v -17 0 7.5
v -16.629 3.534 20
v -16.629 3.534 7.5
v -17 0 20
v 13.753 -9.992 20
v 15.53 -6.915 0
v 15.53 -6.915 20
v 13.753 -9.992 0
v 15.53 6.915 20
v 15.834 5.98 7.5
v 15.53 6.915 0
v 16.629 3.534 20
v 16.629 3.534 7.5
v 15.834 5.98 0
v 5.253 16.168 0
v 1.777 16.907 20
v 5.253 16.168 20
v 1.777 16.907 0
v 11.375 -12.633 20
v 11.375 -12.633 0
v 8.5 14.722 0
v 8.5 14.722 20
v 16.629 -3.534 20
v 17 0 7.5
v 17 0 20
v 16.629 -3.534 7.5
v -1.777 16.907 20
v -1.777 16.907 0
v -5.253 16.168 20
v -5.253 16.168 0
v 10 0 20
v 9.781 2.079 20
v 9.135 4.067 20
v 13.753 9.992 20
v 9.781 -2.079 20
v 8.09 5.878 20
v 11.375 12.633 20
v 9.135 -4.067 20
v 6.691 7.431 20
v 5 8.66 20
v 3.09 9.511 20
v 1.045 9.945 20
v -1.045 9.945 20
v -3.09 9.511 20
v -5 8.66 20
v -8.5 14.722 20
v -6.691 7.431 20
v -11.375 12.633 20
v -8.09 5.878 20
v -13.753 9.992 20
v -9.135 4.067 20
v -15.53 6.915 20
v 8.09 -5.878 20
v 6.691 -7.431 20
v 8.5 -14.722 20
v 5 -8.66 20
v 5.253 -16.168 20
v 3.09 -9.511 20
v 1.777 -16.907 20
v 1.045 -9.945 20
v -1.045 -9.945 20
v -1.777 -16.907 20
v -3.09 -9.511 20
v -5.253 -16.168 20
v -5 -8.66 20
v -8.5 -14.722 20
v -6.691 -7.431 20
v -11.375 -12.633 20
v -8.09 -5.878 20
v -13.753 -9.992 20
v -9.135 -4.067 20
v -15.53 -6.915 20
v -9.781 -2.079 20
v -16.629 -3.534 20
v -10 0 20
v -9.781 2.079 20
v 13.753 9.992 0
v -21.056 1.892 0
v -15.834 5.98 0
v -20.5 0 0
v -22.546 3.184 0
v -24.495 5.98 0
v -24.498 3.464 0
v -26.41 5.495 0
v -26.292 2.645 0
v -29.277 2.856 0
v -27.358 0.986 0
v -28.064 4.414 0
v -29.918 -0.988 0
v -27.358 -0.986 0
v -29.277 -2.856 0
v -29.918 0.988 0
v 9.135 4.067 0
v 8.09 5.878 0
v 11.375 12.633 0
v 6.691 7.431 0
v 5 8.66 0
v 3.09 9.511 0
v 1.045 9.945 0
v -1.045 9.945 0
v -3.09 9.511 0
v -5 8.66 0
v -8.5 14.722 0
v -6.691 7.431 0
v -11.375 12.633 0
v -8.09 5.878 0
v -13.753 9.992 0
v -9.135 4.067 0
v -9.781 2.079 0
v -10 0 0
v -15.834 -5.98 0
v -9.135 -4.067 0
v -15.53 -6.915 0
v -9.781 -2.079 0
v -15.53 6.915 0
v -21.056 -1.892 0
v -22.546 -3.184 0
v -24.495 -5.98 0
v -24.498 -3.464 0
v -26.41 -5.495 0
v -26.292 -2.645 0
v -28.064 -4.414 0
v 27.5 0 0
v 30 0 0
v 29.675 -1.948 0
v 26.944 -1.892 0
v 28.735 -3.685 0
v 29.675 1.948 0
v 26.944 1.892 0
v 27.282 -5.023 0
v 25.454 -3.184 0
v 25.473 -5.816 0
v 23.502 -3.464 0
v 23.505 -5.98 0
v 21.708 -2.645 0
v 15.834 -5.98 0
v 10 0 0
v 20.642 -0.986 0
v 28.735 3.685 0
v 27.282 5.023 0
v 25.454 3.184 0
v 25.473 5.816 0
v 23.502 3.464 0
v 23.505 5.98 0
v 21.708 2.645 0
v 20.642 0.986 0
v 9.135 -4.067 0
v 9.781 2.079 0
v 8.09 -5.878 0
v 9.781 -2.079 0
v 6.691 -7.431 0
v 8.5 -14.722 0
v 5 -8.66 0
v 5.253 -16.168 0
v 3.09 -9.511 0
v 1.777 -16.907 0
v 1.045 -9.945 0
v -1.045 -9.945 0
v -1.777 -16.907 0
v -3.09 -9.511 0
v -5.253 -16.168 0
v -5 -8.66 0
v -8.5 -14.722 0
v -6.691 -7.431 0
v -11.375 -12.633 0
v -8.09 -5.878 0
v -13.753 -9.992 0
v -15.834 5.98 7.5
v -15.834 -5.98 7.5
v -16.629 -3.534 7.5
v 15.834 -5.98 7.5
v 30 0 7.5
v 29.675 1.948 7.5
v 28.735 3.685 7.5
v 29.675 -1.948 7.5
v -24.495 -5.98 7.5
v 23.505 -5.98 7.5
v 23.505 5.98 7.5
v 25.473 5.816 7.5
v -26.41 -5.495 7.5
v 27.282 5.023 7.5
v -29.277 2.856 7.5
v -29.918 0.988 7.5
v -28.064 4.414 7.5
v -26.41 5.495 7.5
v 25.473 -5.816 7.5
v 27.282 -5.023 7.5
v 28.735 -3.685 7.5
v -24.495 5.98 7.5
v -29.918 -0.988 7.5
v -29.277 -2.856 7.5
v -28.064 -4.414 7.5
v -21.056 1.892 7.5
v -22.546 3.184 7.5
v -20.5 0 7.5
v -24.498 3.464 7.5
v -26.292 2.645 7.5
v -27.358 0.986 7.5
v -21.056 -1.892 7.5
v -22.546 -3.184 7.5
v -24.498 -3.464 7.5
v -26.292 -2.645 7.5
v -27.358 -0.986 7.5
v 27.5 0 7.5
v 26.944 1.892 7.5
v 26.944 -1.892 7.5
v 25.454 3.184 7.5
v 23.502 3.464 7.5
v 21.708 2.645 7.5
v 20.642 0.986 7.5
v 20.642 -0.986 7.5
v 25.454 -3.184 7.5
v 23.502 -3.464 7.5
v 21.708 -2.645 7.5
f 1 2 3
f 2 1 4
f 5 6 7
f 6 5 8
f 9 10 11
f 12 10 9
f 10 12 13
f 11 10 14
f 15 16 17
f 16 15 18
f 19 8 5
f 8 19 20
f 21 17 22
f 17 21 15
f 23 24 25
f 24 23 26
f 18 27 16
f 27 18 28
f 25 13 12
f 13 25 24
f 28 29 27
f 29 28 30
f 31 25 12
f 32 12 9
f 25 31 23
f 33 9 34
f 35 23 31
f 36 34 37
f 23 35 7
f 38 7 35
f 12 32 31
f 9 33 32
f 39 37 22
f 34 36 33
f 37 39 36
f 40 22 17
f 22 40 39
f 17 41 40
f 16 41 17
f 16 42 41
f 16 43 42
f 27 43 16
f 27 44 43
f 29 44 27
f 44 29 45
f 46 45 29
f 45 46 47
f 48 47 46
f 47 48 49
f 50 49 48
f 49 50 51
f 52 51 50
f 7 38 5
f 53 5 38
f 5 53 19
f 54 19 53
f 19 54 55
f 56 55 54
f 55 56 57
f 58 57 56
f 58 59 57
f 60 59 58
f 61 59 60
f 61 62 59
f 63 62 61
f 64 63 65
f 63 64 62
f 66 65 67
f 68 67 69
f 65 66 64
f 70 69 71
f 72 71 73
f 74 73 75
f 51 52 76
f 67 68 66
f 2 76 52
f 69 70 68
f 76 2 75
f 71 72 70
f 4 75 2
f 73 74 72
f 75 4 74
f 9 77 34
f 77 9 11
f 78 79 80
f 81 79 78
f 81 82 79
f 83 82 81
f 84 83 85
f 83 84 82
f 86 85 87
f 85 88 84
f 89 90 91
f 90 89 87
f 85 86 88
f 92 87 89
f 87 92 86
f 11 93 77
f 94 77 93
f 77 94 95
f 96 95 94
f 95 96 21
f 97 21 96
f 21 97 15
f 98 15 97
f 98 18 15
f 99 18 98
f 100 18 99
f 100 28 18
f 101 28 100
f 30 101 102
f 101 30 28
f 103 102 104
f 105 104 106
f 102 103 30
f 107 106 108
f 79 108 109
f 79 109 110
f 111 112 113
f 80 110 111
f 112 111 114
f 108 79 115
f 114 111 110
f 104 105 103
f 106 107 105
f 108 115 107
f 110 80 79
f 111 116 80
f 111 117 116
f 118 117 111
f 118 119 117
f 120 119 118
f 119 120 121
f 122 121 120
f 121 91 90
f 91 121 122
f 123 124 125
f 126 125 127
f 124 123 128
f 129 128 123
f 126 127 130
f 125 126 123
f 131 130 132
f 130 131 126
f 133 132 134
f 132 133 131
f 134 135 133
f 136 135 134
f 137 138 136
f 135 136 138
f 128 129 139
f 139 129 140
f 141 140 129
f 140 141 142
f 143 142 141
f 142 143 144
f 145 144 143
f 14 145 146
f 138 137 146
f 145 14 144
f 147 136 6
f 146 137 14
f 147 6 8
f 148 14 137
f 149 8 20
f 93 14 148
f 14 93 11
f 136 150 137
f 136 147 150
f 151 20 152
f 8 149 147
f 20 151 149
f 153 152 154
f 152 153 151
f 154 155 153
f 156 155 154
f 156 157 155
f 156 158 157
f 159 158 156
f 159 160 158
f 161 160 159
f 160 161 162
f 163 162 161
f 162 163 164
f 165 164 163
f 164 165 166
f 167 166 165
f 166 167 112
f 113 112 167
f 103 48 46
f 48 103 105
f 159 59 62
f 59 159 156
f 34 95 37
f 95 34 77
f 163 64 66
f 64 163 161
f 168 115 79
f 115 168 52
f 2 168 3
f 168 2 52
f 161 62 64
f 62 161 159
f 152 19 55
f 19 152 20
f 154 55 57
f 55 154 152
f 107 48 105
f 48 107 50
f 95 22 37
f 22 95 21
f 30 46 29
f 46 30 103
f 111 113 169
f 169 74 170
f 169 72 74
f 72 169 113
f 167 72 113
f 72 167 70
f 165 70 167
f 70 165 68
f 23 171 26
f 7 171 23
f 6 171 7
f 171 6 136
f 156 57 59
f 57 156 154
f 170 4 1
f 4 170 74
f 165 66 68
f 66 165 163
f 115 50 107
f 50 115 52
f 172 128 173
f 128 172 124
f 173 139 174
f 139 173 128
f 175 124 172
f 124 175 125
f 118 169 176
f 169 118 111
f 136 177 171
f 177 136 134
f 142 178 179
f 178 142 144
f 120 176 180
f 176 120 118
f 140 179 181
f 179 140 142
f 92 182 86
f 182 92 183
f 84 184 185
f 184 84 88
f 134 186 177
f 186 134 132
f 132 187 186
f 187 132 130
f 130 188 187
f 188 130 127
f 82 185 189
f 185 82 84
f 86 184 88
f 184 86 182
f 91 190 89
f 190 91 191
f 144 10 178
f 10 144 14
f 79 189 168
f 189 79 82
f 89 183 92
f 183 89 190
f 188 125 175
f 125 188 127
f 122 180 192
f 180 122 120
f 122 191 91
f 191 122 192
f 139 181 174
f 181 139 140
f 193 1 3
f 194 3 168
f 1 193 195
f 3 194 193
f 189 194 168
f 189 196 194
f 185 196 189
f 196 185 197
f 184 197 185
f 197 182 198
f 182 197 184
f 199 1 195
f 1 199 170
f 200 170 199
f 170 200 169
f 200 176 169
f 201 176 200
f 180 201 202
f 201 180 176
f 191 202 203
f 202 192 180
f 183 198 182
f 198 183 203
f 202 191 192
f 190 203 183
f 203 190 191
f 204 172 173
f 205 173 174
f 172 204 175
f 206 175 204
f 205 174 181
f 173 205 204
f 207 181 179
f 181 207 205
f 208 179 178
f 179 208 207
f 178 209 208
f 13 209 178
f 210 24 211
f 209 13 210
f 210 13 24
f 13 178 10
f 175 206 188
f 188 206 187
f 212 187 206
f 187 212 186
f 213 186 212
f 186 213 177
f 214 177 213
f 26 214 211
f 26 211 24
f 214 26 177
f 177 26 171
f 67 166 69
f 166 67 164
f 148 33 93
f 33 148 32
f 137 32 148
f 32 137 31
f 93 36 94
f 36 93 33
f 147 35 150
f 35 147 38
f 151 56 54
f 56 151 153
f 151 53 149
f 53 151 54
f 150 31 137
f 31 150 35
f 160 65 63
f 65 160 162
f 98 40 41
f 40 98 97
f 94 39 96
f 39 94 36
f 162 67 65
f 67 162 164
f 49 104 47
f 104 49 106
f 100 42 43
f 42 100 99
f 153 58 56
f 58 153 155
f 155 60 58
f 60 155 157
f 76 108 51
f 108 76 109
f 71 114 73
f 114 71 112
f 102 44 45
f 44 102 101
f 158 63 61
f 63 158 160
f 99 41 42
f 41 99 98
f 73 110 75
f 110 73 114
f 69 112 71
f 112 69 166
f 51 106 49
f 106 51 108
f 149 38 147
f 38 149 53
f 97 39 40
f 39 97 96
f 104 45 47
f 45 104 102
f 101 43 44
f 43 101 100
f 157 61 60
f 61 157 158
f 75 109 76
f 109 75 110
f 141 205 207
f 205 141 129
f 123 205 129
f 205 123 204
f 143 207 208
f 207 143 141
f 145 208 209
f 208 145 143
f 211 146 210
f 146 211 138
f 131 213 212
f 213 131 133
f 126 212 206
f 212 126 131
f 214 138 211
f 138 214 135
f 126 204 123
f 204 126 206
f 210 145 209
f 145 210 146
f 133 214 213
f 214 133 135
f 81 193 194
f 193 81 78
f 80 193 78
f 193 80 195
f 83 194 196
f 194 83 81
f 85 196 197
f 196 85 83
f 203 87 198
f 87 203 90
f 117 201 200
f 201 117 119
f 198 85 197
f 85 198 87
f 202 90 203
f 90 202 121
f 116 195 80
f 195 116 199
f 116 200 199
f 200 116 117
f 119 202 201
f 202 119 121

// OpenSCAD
// file: config.scad
// Author: Mihai Oltean, https://mihaioltean.github.io, mihai.oltean@gmail.com
// More details: https://jenny5.org, https://jenny5-robot.github.io/
// Source code: github.com/jenny5-robot
// MIT License
//--------------------------------------------------------------

aluminium_color = "Silver";
screw_color = "LightSlateGray";
frame_color = aluminium_color;
shaft_color = "Silver";
plastic_color = "Yellow";
pulley_color = "DarkSlateGray";
steel_color = "LightSlateGray";
// file: tolerance.scad
// Author: Mihai Oltean, https://mihaioltean.github.io, mihai.oltean@gmail.com
// More details: https://jenny5.org, https://jenny5-robot.github.io/
// Source code: github.com/jenny5-robot
// MIT License
//--------------------------------------------------------------

tolerance = 0.1;
display_tolerance = 1;

overlap_tolerance = 0.01;

tolerance_z = [0, 0, tolerance];
tolerance_x = [tolerance, 0, 0];
tolerance_y = [0, tolerance, 0];

display_tolerance_z = [0, 0, display_tolerance];
display_tolerance_x = [display_tolerance, 0, 0];
display_tolerance_y = [0, display_tolerance, 0];

display_tolerance_xz = [display_tolerance, 0, display_tolerance];
display_tolerance_xy = [display_tolerance, display_tolerance, 0];
display_tolerance_yz = [0, display_tolerance, display_tolerance];

display_tolerance_xyz = [display_tolerance, display_tolerance, display_tolerance];
// file: shaft_support_params.scad
// Author: Mihai Oltean, https://mihaioltean.github.io, mihai.oltean@gmail.com
// More details: https://jenny5.org, https://jenny5-robot.github.io/
// Source code: github.com/jenny5-robot
// MIT License
//--------------------------------------------------------------
 
SHF20_shaft_suport_length = 60;
SHF20_shaft_suport_height = 20;
SHF20_shaft_suport_small_height = 7.5;
SHF20_shaft_suport_middle_external_radius = 17;
SHF20_shaft_suport_middle_internal_radius = 10;
SHF20_shaft_suport_distance_between_holes = 48;
SHF20_shaft_suport_lateral_internal_radius = 3.5;
// main file
// Author: Mihai Oltean, https://mihaioltean.github.io, mihai.oltean@gmail.com
// More details: https://jenny5.org, https://jenny5-robot.github.io/
// Source code: github.com/jenny5-robot
// MIT License
//--------------------------------------------------------------

include <shaft_support_params.scad>
include <tolerance.scad>
include <config.scad>

//--------------------------------------------------------------
module shaft_support_SHF20()
{
    color(aluminium_color)
    difference(){
        union(){
            cylinder(h = SHF20_shaft_suport_height, r = SHF20_shaft_suport_middle_external_radius);
            hull(){
            translate ([SHF20_shaft_suport_distance_between_holes / 2, 0, 0])     cylinder(h = SHF20_shaft_suport_small_height, r = SHF20_shaft_suport_lateral_internal_radius + 2.5);
            translate ([-SHF20_shaft_suport_distance_between_holes / 2, 0, 0])     cylinder(h = SHF20_shaft_suport_small_height, r = SHF20_shaft_suport_lateral_internal_radius + 2.5);
            }
        }
        // now holes
            translate (-display_tolerance_z) cylinder(h = SHF20_shaft_suport_height + 2 * display_tolerance, r = SHF20_shaft_suport_middle_internal_radius);
            translate ([SHF20_shaft_suport_distance_between_holes / 2, 0, 0]-display_tolerance_z)     cylinder(h = SHF20_shaft_suport_small_height + 2 * display_tolerance, r = SHF20_shaft_suport_lateral_internal_radius);
            translate ([-SHF20_shaft_suport_distance_between_holes / 2, 0, 0]-display_tolerance_z)     cylinder(h = SHF20_shaft_suport_small_height + 2 * display_tolerance, r = SHF20_shaft_suport_lateral_internal_radius);
        
    }
}

//--------------------------------------------------------------


shaft_support_SHF20();
